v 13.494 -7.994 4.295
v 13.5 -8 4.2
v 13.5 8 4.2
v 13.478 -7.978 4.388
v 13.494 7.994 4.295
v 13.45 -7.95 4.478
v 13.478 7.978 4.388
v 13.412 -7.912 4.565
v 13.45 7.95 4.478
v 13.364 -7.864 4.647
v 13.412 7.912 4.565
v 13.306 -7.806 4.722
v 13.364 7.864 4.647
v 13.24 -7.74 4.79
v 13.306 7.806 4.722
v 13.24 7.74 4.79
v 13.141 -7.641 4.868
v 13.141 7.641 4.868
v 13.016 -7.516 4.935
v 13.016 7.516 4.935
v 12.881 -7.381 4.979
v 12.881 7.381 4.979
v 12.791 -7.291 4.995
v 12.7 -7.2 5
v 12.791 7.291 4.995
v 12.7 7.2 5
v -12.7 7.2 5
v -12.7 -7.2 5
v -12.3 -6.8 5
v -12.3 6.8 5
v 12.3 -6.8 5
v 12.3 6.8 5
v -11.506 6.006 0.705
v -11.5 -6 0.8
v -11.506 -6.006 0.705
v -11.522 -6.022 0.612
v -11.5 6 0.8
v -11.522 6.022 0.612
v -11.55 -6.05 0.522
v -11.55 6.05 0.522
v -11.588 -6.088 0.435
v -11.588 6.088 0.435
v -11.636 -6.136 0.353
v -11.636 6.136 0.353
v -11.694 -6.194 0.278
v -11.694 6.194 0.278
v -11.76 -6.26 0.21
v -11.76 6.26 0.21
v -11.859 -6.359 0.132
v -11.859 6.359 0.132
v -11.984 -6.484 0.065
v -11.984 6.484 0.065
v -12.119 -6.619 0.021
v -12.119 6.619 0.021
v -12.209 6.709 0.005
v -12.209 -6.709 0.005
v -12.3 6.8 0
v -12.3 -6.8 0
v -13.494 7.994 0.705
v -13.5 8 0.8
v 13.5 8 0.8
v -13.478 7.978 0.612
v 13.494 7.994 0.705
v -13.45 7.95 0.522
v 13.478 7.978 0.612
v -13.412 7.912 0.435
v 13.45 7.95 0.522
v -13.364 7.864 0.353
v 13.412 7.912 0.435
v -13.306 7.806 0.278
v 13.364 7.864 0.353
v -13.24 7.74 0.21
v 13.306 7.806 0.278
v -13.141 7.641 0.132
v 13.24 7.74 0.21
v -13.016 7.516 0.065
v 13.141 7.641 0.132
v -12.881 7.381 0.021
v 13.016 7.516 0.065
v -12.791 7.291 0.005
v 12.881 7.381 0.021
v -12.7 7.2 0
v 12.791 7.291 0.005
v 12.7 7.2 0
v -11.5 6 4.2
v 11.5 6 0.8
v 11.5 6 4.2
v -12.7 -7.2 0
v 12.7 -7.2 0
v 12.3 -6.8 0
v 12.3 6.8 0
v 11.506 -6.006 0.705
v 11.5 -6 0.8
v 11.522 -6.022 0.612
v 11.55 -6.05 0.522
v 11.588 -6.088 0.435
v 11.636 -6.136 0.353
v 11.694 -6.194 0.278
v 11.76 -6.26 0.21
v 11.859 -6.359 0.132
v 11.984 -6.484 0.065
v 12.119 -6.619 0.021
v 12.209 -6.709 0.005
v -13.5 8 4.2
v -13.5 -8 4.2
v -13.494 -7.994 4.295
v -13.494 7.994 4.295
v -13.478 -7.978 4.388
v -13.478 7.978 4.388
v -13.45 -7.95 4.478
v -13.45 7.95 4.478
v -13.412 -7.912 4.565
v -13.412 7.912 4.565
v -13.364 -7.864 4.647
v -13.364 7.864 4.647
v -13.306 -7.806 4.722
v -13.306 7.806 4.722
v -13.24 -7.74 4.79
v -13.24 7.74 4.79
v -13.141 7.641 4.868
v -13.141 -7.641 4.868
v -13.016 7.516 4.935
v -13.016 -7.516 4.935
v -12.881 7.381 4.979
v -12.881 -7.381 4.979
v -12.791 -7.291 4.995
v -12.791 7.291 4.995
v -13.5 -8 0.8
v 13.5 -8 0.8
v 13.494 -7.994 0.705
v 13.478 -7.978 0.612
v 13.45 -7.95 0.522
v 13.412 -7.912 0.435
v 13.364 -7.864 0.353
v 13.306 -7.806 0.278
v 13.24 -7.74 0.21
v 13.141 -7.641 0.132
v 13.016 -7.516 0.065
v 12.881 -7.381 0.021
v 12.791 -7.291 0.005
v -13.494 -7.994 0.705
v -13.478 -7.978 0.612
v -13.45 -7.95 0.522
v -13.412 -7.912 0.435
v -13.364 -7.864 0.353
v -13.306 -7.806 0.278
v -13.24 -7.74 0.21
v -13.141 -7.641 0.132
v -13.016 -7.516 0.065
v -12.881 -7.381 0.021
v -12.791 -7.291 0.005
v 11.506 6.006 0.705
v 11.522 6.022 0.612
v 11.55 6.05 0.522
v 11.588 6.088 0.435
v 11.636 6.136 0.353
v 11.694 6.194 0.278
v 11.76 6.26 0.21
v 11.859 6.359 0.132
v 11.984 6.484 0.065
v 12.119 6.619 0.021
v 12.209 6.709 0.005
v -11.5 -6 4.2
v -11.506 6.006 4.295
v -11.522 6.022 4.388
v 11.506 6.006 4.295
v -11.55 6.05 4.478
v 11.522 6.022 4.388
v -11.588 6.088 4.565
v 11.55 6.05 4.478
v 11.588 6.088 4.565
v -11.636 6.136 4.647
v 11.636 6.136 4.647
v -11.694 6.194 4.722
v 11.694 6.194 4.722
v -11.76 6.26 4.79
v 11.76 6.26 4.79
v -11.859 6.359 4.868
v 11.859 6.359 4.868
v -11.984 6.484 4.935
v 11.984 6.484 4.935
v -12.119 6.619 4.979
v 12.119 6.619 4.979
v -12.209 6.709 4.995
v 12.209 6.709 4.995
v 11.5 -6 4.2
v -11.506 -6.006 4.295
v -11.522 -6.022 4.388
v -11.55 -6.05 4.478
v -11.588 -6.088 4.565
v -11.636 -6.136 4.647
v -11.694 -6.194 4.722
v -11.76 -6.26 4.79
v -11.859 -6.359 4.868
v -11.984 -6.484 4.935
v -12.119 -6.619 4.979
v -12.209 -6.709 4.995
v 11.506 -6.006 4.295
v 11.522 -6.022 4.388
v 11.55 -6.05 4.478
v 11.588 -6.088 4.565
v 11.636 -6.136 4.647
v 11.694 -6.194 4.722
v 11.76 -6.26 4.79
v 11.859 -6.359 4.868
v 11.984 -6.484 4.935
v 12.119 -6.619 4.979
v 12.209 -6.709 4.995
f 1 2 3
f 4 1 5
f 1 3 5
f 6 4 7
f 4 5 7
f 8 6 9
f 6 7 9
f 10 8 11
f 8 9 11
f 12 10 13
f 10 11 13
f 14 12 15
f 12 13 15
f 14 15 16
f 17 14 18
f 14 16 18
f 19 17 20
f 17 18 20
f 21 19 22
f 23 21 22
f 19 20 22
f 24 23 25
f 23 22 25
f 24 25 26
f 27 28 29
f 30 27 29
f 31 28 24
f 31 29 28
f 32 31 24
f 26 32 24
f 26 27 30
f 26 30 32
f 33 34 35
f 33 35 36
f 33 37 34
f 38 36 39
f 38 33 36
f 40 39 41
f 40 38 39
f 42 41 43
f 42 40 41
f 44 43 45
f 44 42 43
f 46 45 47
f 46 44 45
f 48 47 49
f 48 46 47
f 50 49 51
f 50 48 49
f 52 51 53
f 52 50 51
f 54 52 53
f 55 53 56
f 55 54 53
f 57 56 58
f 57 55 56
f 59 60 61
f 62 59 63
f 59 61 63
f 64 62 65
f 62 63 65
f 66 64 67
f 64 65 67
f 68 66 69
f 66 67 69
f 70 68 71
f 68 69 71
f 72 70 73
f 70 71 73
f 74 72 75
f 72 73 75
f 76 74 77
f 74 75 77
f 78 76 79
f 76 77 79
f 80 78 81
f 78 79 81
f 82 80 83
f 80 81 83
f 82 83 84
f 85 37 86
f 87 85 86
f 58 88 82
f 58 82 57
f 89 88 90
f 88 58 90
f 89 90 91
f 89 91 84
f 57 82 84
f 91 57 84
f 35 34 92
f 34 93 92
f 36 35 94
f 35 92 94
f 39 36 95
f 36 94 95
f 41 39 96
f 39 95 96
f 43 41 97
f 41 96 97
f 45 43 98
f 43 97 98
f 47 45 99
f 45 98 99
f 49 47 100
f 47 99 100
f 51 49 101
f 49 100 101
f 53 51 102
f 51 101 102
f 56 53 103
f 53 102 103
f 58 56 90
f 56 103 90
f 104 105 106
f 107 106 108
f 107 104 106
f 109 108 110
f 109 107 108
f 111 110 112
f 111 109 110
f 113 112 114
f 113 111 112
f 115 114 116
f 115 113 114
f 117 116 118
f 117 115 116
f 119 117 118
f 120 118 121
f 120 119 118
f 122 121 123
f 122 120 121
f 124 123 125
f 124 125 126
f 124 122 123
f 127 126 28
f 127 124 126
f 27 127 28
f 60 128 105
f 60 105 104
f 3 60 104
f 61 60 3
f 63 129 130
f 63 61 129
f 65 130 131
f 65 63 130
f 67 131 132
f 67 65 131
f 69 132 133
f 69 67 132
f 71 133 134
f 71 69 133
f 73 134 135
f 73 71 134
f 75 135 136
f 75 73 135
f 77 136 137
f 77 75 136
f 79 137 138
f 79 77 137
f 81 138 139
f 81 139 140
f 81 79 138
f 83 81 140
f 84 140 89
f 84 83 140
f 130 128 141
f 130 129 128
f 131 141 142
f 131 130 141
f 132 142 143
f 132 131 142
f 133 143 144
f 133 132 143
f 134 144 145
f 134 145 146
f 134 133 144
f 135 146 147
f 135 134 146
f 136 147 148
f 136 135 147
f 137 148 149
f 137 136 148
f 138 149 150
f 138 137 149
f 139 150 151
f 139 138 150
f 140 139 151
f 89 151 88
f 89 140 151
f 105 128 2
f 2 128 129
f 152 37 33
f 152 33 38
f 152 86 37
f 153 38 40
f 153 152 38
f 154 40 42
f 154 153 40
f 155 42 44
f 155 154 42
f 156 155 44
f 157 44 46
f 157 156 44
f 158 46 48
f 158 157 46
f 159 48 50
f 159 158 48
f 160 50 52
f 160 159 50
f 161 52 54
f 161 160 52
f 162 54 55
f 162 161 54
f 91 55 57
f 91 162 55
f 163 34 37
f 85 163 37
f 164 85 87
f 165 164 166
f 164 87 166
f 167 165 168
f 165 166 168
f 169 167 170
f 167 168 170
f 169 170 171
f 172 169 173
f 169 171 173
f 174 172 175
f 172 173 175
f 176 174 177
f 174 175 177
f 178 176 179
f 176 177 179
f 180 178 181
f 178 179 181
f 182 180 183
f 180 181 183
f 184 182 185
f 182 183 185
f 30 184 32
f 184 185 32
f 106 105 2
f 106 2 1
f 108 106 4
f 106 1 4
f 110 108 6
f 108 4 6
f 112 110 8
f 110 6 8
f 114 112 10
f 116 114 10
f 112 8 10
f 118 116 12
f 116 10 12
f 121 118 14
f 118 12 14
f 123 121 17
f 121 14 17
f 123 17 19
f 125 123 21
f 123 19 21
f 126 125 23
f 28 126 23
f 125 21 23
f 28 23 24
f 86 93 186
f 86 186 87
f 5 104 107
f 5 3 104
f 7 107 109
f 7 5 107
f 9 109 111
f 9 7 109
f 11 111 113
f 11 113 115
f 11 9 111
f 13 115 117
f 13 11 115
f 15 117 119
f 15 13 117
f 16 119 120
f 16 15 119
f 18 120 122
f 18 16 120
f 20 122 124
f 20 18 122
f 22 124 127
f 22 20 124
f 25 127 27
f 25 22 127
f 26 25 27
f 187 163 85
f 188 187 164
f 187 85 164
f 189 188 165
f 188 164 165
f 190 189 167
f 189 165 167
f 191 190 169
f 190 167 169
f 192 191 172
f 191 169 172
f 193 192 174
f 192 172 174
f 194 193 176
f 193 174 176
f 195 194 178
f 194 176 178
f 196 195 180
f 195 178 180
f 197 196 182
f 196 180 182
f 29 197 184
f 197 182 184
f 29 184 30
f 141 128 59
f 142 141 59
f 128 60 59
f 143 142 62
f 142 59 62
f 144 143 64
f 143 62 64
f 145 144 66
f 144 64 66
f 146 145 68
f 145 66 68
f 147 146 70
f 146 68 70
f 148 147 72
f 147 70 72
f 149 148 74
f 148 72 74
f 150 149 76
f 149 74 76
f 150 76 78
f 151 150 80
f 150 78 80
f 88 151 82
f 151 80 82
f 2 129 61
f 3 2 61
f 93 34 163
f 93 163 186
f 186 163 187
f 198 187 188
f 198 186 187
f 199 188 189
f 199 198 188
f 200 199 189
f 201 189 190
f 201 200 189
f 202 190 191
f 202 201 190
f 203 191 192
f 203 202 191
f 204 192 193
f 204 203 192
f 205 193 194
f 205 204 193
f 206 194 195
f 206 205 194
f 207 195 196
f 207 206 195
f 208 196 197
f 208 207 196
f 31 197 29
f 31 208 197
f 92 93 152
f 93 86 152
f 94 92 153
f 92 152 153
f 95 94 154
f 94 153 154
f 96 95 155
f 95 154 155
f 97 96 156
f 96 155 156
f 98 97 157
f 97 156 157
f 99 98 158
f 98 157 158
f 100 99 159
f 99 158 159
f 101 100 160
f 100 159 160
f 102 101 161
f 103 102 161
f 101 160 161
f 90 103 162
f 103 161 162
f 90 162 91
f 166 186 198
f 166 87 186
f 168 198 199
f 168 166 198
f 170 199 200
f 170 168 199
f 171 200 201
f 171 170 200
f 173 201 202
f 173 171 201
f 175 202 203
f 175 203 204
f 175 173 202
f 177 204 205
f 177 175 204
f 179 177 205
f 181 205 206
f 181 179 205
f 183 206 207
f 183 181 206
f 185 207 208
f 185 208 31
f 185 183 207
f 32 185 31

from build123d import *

# Parameters (mm, degrees)
F0_W     = 27
F0_H     = 16
F0_W_2   = 23
F0_H_2   = 12
F1_DEPTH = 5
F2_R     = 0.8


with BuildPart() as f1:
    # F0 (on Top) → F1 (new body)
    with BuildSketch(Plane.XY):
        Rectangle(F0_W, F0_H)
        Rectangle(F0_W_2, F0_H_2, mode=Mode.SUBTRACT)
    extrude(amount=F1_DEPTH)

    # F2
    f2_edges = [f1.edges().sort_by_distance(p)[0] for p in [
        (0, 8, 5),
        (13.5, 0, 5),
        (0, -8, 5),
        (-13.5, 0, 5),
        (-11.5, 0, 5),
        (0, 6, 5),
        (0, -6, 5),
        (11.5, 0, 5),
        (0, -8, 0),
        (0, -6, 0),
        (0, 6, 0),
        (0, 8, 0),
        (13.5, 0, 0),
        (11.5, 0, 0),
        (-13.5, 0, 0),
        (-11.5, 0, 0),
    ]]
    fillet(f2_edges, radius=F2_R)


solid = f1.part
